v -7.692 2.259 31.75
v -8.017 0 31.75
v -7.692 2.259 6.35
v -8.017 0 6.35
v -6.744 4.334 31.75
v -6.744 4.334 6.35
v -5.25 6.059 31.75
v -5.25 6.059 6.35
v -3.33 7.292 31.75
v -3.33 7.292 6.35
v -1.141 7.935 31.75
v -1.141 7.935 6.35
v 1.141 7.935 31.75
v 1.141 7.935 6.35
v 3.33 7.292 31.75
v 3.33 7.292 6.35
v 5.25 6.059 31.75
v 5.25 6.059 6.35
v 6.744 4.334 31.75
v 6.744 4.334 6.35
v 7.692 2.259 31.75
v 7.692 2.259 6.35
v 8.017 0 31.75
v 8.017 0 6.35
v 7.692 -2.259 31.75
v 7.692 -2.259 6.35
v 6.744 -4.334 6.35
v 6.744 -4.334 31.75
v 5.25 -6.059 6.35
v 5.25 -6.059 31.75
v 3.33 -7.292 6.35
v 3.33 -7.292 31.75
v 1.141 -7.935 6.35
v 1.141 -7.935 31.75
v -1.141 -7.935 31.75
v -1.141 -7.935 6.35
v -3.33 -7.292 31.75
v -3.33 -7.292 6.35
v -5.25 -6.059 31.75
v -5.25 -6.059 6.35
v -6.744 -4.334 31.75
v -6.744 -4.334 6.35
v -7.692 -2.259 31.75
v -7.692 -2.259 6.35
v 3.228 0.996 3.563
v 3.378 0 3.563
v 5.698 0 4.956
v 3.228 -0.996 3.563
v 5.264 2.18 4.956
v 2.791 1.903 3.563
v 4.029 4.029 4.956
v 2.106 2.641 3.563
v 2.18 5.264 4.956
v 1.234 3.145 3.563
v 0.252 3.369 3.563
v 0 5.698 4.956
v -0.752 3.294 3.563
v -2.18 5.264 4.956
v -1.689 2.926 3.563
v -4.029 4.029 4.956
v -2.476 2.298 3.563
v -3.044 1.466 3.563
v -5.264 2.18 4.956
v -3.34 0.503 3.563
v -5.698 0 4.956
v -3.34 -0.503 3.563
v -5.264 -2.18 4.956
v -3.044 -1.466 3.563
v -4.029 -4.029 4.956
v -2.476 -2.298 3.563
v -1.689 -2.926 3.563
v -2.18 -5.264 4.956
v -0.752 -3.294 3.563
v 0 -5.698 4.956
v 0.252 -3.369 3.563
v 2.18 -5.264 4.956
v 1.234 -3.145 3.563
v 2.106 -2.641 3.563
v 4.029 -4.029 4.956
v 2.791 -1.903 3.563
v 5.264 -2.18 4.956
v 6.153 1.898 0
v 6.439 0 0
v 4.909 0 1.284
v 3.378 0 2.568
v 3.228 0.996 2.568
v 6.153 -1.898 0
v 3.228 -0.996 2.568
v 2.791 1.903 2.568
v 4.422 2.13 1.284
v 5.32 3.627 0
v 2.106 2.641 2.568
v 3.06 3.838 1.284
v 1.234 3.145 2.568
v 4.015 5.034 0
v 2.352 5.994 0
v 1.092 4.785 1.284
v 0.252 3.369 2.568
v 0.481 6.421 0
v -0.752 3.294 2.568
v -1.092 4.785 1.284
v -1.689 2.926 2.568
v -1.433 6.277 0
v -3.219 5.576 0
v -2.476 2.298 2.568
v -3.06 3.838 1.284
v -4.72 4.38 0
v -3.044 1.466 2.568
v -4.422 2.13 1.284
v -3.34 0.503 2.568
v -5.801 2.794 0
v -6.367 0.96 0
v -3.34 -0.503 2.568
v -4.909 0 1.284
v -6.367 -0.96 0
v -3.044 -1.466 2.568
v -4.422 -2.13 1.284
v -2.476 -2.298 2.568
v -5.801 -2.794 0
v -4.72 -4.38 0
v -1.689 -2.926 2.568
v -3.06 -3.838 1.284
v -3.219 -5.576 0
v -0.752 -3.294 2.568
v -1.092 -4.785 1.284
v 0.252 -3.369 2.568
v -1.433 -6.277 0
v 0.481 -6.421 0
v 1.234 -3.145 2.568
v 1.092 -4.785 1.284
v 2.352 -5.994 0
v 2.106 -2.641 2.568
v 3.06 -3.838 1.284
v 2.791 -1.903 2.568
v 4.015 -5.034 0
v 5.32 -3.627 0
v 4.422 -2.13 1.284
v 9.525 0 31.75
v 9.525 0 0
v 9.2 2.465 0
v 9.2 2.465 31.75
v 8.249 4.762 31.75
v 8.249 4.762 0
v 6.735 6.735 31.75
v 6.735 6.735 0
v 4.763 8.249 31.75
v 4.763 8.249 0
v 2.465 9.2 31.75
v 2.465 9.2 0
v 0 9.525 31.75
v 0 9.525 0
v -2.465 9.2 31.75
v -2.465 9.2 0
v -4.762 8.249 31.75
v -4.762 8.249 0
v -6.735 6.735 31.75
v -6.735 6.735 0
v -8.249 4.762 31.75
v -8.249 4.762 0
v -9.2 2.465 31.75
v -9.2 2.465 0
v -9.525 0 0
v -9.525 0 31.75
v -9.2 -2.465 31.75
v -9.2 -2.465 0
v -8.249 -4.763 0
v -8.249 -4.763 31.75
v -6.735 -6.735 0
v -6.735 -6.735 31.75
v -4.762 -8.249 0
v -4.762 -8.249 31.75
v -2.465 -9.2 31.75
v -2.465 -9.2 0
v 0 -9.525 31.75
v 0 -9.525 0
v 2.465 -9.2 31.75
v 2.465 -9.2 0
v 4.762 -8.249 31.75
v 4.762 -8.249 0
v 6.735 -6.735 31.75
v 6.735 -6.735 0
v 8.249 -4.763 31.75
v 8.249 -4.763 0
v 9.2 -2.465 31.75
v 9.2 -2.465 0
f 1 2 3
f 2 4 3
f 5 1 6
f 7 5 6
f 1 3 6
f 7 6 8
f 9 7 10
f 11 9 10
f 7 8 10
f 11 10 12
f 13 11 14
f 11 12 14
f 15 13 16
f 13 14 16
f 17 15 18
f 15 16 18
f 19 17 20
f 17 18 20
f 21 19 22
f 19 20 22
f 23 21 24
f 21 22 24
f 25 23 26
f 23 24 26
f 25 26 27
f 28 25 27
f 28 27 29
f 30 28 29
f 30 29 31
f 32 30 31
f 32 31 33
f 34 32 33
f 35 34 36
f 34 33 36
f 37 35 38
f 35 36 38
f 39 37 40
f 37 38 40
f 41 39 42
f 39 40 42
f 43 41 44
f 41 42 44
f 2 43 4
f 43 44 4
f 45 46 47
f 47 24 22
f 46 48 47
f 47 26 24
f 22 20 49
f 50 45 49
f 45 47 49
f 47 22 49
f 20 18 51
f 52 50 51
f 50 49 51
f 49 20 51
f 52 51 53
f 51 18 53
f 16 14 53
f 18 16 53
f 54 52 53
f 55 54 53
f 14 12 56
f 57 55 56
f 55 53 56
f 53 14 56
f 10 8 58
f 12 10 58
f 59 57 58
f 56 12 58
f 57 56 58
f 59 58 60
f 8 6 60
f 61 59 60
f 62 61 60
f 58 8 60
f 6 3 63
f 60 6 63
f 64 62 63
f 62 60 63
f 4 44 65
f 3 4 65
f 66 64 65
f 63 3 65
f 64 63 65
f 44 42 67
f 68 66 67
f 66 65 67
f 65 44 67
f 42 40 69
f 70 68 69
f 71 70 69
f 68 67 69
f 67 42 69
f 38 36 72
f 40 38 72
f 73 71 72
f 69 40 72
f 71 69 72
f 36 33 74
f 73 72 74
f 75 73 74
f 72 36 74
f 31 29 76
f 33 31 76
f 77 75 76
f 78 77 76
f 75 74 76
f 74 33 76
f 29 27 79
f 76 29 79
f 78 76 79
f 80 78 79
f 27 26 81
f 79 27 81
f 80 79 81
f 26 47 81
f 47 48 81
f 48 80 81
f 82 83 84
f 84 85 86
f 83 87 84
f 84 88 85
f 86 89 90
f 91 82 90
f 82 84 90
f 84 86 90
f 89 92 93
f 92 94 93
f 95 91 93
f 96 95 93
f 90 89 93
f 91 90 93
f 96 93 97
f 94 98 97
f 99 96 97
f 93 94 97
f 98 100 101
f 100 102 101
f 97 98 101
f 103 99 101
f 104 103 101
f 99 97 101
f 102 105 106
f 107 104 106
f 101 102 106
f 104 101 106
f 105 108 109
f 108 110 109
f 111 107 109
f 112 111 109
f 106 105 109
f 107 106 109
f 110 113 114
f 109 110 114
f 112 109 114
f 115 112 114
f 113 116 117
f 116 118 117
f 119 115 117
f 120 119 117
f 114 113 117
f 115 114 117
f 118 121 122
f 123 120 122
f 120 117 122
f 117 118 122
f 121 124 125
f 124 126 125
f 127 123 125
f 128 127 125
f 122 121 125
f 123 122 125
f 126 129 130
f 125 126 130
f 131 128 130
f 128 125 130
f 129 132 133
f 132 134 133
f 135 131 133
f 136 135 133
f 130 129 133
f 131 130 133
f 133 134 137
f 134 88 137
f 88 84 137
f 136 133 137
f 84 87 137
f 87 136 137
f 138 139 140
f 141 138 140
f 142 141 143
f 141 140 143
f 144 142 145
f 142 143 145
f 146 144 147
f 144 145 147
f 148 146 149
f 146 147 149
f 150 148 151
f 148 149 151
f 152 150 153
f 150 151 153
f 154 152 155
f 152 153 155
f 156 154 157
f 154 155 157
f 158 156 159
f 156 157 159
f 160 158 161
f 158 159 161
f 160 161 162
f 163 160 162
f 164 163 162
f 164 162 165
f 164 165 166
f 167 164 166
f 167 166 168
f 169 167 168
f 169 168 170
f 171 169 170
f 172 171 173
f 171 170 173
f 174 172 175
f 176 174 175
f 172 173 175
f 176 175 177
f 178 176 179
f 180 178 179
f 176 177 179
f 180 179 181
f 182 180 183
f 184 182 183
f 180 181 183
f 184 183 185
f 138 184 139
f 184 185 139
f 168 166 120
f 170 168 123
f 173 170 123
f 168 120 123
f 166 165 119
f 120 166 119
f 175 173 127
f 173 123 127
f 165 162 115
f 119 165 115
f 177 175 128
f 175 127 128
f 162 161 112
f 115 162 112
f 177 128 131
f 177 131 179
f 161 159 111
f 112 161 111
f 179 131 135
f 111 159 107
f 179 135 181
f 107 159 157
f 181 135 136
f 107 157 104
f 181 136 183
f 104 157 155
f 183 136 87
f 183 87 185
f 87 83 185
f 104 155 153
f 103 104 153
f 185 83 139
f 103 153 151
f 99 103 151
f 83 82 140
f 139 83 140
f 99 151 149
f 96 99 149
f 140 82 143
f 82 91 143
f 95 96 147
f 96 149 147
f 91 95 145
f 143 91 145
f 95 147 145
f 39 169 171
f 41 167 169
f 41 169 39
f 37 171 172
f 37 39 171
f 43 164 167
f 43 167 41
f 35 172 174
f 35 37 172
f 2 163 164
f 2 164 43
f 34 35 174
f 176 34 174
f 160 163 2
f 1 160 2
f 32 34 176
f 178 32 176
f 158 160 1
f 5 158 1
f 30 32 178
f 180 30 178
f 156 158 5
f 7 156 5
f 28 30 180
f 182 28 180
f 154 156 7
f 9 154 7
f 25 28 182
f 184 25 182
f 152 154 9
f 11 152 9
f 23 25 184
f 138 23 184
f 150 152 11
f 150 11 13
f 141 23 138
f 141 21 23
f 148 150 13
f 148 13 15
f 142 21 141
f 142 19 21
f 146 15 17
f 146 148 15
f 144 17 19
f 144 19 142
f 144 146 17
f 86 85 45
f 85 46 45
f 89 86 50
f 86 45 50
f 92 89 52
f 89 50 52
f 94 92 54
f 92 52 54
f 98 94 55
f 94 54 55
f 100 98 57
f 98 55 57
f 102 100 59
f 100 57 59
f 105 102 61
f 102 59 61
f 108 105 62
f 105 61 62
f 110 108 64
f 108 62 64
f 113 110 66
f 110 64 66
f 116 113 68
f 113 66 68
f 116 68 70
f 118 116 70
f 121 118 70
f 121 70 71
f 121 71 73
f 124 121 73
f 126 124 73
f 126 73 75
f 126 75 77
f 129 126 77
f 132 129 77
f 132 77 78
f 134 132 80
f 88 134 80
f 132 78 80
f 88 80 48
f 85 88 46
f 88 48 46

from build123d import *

# Parameters (mm, degrees)
SKETCH1_R                                           = 9.525
BOSS_EXTRUDE1_DEPTH                                 = 31.75
F_17_32_0_53125_DIAMETER_HOLE3_D                    = 16.03375
F_17_32_0_53125_DIAMETER_HOLE3_DEPTH                = 25.4
F_17_32_0_53125_DIAMETER_HOLE3_TIP                  = 4.817024475
CSK_FOR_1_4_FLAT_HEAD_MACHINE_SCREW_100_D           = 6.7564
CSK_FOR_1_4_FLAT_HEAD_MACHINE_SCREW_100_DEPTH       = 25.4
CSK_FOR_1_4_FLAT_HEAD_MACHINE_SCREW_100_CSINK_D     = 12.8778
CSK_FOR_1_4_FLAT_HEAD_MACHINE_SCREW_100_CSINK_ANGLE = 100
CSK_FOR_1_4_FLAT_HEAD_MACHINE_SCREW_100_TIP         = 2.029827343


with BuildPart() as part:
    # Sketch1 → Boss-Extrude1 (new body)
    with BuildSketch(Plane.XY):
        Circle(SKETCH1_R)
    extrude(amount=BOSS_EXTRUDE1_DEPTH)

    # 17/32 (0.53125) Diameter Hole3
    with Locations(Plane.XY.offset(31.75)):
        with Locations((0, 0)):
            Hole(F_17_32_0_53125_DIAMETER_HOLE3_D / 2, depth=F_17_32_0_53125_DIAMETER_HOLE3_DEPTH)
            with Locations((0, 0, -(F_17_32_0_53125_DIAMETER_HOLE3_DEPTH + F_17_32_0_53125_DIAMETER_HOLE3_TIP / 2))):  # 118° drill point
                Cone(0, F_17_32_0_53125_DIAMETER_HOLE3_D / 2, F_17_32_0_53125_DIAMETER_HOLE3_TIP, mode=Mode.SUBTRACT)

    # CSK for 1/4 Flat Head Machine Screw (100)1
    with Locations(Plane(origin=(0, 0, 0), x_dir=(-1, 0, 0), z_dir=(0, 0, -1))):
        with Locations((0, 0)):
            CounterSinkHole(CSK_FOR_1_4_FLAT_HEAD_MACHINE_SCREW_100_D / 2, CSK_FOR_1_4_FLAT_HEAD_MACHINE_SCREW_100_CSINK_D / 2, depth=CSK_FOR_1_4_FLAT_HEAD_MACHINE_SCREW_100_DEPTH, counter_sink_angle=CSK_FOR_1_4_FLAT_HEAD_MACHINE_SCREW_100_CSINK_ANGLE)
            with Locations((0, 0, -(CSK_FOR_1_4_FLAT_HEAD_MACHINE_SCREW_100_DEPTH + CSK_FOR_1_4_FLAT_HEAD_MACHINE_SCREW_100_TIP / 2))):  # 118° drill point
                Cone(0, CSK_FOR_1_4_FLAT_HEAD_MACHINE_SCREW_100_D / 2, CSK_FOR_1_4_FLAT_HEAD_MACHINE_SCREW_100_TIP, mode=Mode.SUBTRACT)


solid = part.part
